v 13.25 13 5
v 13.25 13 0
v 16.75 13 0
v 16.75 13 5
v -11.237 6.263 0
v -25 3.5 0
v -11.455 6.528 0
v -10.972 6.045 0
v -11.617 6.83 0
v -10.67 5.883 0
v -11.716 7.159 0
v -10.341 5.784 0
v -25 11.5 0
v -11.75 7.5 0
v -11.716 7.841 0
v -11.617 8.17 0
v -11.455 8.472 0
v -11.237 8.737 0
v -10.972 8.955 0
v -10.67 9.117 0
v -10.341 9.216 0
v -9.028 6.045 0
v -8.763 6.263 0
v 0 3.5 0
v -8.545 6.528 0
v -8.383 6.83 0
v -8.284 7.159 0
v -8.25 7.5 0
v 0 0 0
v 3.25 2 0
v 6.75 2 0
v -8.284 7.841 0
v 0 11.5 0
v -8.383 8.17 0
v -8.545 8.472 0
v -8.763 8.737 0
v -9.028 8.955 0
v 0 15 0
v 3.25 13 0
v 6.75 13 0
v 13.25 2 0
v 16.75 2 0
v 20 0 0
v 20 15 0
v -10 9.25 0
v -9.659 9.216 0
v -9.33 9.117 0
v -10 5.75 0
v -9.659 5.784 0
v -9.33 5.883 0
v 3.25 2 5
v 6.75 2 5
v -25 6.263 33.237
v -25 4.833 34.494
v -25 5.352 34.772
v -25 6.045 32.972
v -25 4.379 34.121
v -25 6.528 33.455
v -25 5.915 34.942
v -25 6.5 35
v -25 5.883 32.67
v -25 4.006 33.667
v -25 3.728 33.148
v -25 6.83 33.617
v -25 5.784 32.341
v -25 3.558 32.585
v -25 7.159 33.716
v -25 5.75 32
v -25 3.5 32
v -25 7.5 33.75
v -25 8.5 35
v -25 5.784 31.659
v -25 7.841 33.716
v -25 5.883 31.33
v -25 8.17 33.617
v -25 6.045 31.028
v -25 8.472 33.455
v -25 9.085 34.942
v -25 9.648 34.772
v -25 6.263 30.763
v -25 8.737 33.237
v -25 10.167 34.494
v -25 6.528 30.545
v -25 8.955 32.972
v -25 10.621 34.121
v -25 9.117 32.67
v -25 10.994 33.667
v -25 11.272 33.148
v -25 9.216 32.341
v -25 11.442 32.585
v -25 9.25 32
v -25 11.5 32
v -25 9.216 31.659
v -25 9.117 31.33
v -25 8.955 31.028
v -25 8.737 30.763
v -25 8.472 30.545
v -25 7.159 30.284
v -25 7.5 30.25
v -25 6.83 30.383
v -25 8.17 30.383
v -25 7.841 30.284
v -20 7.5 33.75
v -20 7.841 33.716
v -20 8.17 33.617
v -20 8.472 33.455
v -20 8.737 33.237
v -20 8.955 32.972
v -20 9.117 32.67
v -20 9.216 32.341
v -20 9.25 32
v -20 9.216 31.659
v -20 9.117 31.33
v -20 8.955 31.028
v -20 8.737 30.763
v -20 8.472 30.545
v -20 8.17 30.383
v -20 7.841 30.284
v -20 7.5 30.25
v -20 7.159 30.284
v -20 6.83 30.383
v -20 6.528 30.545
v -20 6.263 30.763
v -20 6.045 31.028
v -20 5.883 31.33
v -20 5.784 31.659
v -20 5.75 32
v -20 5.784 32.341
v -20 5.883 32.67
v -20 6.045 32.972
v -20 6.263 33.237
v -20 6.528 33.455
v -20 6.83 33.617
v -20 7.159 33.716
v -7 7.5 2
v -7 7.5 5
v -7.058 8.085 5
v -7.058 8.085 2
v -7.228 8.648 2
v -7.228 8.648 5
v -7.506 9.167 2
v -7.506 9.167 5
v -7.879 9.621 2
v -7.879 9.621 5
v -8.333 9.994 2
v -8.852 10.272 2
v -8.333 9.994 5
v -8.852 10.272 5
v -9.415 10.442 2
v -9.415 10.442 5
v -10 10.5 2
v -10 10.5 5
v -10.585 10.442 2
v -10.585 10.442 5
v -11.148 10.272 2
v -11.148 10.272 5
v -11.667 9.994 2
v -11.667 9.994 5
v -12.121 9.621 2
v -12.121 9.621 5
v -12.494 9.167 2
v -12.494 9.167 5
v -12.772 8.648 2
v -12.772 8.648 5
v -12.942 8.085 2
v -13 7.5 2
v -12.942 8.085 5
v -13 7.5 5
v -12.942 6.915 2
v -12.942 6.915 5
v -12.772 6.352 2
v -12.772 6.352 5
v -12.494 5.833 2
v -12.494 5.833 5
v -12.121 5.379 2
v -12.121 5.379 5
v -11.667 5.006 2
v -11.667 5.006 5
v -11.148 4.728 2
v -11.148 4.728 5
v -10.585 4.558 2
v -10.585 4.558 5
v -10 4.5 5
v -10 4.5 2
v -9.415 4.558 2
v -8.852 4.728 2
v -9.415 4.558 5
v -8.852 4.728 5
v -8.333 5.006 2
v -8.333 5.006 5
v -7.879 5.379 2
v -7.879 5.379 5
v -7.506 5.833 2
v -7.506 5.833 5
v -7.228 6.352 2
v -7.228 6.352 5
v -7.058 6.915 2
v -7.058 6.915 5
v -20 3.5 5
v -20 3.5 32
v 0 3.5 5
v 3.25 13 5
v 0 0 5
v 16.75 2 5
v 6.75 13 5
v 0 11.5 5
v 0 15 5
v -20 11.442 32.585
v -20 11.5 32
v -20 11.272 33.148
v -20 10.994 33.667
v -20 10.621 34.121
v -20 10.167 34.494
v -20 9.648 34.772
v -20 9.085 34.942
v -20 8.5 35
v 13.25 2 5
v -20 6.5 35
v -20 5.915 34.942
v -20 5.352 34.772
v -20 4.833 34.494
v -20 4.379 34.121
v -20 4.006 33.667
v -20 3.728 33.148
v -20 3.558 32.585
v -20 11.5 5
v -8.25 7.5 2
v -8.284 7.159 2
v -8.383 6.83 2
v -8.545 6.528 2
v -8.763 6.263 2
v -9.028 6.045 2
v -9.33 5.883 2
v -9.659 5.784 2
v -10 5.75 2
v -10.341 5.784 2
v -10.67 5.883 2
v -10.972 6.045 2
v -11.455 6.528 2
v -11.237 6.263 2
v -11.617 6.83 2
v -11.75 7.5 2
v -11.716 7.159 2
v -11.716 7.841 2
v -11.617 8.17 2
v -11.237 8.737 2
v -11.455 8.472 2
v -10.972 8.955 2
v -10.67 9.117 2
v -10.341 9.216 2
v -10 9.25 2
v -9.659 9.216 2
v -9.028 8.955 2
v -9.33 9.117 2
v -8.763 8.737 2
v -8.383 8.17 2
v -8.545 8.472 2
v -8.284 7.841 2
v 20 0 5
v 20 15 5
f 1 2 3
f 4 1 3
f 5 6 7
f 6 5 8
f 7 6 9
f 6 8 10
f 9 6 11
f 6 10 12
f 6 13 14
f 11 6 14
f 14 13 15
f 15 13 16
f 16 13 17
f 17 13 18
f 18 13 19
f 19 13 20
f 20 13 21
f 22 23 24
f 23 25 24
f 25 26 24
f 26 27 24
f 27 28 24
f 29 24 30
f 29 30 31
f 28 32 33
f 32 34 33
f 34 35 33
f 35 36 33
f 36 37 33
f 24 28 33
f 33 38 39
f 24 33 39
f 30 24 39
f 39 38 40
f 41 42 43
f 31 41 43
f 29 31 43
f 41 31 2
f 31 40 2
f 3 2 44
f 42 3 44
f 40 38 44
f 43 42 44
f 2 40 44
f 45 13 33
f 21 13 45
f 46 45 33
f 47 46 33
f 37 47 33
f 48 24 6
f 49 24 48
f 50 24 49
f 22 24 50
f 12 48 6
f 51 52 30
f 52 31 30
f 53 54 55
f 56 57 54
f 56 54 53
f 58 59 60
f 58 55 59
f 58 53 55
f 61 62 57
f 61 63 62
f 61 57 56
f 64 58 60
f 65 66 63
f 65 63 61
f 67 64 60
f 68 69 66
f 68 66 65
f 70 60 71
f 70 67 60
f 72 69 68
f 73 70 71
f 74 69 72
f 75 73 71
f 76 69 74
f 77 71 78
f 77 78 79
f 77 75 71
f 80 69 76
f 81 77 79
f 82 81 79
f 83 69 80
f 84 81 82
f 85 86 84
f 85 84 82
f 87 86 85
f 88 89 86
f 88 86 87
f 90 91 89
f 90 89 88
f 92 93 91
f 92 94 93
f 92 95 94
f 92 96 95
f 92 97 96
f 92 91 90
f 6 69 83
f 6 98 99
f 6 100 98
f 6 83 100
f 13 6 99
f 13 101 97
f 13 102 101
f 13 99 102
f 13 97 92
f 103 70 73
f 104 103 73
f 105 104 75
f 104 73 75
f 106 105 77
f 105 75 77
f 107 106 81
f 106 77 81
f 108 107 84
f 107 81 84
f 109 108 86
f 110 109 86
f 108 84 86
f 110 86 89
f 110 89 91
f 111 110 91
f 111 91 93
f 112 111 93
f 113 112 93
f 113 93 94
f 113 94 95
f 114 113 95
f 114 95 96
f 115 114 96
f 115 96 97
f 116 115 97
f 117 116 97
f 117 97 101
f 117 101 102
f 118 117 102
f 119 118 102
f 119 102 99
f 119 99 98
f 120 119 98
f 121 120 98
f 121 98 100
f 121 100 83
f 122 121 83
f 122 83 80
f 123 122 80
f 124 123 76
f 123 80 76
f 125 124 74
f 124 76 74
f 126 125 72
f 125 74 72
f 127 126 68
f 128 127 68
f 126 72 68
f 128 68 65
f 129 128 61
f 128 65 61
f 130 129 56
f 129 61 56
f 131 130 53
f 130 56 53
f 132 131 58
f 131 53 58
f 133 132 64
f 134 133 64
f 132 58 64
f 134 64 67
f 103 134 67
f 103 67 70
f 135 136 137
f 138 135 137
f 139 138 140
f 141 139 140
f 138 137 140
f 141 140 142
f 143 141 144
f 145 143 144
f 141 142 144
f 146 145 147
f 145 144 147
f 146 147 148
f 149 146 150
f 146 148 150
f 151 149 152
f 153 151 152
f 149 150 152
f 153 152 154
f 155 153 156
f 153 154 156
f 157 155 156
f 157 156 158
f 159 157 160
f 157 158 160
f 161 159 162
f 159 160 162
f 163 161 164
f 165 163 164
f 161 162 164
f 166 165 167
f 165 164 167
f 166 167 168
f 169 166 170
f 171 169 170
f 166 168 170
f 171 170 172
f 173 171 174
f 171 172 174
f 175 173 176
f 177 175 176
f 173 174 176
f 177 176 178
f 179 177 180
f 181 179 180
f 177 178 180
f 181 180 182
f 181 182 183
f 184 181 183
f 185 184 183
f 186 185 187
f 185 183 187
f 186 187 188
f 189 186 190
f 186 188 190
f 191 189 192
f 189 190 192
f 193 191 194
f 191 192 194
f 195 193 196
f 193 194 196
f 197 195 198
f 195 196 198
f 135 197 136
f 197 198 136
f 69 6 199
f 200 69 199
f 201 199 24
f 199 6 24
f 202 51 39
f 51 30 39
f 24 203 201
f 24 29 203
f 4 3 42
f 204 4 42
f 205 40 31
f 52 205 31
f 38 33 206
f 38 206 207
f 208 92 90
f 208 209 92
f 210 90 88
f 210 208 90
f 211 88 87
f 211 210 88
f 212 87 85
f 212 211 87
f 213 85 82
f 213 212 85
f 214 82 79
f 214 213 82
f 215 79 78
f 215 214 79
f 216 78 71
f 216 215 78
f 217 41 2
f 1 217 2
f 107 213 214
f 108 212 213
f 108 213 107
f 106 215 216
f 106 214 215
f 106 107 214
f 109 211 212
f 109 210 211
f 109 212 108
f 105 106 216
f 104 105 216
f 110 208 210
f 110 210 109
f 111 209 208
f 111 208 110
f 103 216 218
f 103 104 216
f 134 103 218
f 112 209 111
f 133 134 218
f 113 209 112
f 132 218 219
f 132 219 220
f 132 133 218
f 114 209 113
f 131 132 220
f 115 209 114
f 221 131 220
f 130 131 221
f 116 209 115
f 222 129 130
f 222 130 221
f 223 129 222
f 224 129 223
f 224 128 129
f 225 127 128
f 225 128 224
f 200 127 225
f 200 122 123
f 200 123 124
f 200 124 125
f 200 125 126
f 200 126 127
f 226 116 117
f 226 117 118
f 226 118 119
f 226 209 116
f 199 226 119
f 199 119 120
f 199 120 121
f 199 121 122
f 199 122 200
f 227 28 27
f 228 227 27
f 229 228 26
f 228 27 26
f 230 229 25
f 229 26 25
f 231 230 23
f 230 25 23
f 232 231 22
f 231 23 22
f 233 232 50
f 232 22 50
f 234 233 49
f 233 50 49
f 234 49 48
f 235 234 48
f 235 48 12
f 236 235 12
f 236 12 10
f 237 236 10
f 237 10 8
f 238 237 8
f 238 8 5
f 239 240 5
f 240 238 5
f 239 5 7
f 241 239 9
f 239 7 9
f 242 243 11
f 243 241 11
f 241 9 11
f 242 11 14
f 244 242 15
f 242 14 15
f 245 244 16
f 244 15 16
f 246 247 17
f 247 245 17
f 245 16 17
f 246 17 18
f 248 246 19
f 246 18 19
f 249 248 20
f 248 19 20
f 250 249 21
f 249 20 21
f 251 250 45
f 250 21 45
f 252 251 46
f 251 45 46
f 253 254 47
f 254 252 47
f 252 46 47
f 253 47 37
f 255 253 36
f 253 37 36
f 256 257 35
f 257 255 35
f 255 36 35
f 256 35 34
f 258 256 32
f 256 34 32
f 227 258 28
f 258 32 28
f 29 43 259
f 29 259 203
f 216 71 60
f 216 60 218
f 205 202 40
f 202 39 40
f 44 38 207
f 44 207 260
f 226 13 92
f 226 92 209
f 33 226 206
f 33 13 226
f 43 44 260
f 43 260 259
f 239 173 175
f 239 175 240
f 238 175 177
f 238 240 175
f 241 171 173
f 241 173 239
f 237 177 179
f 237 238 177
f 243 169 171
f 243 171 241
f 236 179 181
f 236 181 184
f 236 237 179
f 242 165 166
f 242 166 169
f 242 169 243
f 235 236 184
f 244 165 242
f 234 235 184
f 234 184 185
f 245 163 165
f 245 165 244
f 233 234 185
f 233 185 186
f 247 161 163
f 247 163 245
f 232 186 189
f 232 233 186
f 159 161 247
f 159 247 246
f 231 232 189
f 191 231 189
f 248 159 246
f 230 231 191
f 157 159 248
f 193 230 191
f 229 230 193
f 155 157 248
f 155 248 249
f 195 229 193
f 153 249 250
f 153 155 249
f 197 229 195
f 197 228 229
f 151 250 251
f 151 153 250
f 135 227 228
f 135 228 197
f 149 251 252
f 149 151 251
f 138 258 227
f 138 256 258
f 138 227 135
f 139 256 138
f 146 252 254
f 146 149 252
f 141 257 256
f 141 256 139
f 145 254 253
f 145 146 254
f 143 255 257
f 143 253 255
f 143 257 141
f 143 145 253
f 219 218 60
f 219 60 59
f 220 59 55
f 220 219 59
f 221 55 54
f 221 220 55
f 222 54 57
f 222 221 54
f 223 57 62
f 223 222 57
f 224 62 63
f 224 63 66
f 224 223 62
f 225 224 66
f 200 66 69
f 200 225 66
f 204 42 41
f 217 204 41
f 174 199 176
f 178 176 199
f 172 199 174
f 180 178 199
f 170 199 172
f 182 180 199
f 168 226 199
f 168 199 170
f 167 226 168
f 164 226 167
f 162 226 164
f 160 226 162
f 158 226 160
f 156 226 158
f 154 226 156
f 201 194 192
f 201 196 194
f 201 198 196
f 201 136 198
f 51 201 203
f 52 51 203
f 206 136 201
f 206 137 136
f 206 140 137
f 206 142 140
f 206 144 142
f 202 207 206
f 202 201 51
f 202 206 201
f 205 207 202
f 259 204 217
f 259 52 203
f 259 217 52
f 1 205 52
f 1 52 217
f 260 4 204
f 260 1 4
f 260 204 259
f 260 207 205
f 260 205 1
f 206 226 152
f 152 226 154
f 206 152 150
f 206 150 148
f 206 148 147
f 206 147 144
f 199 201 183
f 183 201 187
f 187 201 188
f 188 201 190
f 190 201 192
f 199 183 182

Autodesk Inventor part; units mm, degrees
ref_plane "YZ Plane" through (0, 0, 0) normal (1, 0, 0) x (0, 1, 0)
ref_plane "XZ Plane" through (0, 0, 0) normal (0, 1, 0) x (-1, 0, 0)
ref_plane "XY Plane" through (0, 0, 0) normal (0, 0, 1) x (1, 0, 0)
sketch "Sketch1" plane through (0, 0, 0) normal (0, 0, 1) x (1, 0, 0)
  line L0 (0, 15) -> (20, 15)
  line L1 (20, 15) -> (20, 0)
  line L2 (20, 0) -> (0, 0)
  line L3 (0, 0) -> (0, 15)
  line L4 (3.25, 13) -> (6.75, 13)
  line L5 (6.75, 13) -> (6.75, 2)
  line L6 (6.75, 2) -> (3.25, 2)
  line L7 (3.25, 2) -> (3.25, 13)
  line L8 (13.25, 13) -> (16.75, 13)
  line L9 (16.75, 13) -> (16.75, 2)
  line L10 (16.75, 2) -> (13.25, 2)
  line L11 (13.25, 2) -> (13.25, 13)
  line L12 (0, 11.5) -> (-25, 11.5)
  line L13 (-25, 11.5) -> (-25, 3.5)
  line L14 (-25, 3.5) -> (0, 3.5)
  line L15 (0, 3.5) -> (0, 11.5)
  circle A0 centre (-10, 7.5) radius 1.75
  point P0 (0, -23)
  point P1 (0, 7.5)
  dimension "d0" = 20
  dimension "d1" = 2
  dimension "d2" = 2
  dimension "d3" = 3.5
  dimension "d4" = 3.25
  dimension "d5" = 6.5
  dimension "d6" = 3.5
  dimension "d8" = 15
  dimension "d9" = 25
  dimension "d10" = 8
  dimension "d22" = 3.5
  dimension "d23" = 10
extrude "Extrusion1" add sketch "Sketch1" along normal blind 5
sketch "Sketch2" plane through (0, 0, 5) normal (0, 0, 1) x (1, 0, 0)
  line L0 (-25, 3.5) -> (0, 3.5) projected
  line L1 (-25, 11.5) -> (-20, 11.5)
  line L2 (-20, 11.5) -> (-20, 3.5)
  line L3 (-20, 3.5) -> (-25, 3.5)
  line L4 (-25, 3.5) -> (-25, 11.5)
  dimension "d24" = 5
extrude "Extrusion2" add sketch "Sketch2" along normal blind 30
sketch "Sketch3" plane through (-25, 3.5, 0) normal (-1, 0, 0) x (0, 0, 1)
  line L0 (35, 8) -> (35, 0) projected
  circle A0 centre (32, 4) radius 1.75
  point P0 (0, -3.5)
  point P1 (35, 4)
  dimension "d17" = 3.5
  dimension "d18" = 3
extrude "Extrusion3" cut sketch "Sketch3" against normal blind 35
fillet "Fillet1" radius 3 2 edges at (-22.5, 11.5, 35) (-22.5, 3.5, 35)
sketch "Sketch4" plane through (0, 0, 5) normal (0, 0, 1) x (1, 0, 0)
  circle A0 centre (-10, 7.5) radius 1.75 projected
  circle A1 centre (-10, 7.5) radius 3
  dimension "d26" = 6
extrude "Extrusion4" cut sketch "Sketch4" against normal blind 3
equation "\"d2\" = d1"
equation "\"d6\" = d3"
properties part number "switch bracket v5.1"
